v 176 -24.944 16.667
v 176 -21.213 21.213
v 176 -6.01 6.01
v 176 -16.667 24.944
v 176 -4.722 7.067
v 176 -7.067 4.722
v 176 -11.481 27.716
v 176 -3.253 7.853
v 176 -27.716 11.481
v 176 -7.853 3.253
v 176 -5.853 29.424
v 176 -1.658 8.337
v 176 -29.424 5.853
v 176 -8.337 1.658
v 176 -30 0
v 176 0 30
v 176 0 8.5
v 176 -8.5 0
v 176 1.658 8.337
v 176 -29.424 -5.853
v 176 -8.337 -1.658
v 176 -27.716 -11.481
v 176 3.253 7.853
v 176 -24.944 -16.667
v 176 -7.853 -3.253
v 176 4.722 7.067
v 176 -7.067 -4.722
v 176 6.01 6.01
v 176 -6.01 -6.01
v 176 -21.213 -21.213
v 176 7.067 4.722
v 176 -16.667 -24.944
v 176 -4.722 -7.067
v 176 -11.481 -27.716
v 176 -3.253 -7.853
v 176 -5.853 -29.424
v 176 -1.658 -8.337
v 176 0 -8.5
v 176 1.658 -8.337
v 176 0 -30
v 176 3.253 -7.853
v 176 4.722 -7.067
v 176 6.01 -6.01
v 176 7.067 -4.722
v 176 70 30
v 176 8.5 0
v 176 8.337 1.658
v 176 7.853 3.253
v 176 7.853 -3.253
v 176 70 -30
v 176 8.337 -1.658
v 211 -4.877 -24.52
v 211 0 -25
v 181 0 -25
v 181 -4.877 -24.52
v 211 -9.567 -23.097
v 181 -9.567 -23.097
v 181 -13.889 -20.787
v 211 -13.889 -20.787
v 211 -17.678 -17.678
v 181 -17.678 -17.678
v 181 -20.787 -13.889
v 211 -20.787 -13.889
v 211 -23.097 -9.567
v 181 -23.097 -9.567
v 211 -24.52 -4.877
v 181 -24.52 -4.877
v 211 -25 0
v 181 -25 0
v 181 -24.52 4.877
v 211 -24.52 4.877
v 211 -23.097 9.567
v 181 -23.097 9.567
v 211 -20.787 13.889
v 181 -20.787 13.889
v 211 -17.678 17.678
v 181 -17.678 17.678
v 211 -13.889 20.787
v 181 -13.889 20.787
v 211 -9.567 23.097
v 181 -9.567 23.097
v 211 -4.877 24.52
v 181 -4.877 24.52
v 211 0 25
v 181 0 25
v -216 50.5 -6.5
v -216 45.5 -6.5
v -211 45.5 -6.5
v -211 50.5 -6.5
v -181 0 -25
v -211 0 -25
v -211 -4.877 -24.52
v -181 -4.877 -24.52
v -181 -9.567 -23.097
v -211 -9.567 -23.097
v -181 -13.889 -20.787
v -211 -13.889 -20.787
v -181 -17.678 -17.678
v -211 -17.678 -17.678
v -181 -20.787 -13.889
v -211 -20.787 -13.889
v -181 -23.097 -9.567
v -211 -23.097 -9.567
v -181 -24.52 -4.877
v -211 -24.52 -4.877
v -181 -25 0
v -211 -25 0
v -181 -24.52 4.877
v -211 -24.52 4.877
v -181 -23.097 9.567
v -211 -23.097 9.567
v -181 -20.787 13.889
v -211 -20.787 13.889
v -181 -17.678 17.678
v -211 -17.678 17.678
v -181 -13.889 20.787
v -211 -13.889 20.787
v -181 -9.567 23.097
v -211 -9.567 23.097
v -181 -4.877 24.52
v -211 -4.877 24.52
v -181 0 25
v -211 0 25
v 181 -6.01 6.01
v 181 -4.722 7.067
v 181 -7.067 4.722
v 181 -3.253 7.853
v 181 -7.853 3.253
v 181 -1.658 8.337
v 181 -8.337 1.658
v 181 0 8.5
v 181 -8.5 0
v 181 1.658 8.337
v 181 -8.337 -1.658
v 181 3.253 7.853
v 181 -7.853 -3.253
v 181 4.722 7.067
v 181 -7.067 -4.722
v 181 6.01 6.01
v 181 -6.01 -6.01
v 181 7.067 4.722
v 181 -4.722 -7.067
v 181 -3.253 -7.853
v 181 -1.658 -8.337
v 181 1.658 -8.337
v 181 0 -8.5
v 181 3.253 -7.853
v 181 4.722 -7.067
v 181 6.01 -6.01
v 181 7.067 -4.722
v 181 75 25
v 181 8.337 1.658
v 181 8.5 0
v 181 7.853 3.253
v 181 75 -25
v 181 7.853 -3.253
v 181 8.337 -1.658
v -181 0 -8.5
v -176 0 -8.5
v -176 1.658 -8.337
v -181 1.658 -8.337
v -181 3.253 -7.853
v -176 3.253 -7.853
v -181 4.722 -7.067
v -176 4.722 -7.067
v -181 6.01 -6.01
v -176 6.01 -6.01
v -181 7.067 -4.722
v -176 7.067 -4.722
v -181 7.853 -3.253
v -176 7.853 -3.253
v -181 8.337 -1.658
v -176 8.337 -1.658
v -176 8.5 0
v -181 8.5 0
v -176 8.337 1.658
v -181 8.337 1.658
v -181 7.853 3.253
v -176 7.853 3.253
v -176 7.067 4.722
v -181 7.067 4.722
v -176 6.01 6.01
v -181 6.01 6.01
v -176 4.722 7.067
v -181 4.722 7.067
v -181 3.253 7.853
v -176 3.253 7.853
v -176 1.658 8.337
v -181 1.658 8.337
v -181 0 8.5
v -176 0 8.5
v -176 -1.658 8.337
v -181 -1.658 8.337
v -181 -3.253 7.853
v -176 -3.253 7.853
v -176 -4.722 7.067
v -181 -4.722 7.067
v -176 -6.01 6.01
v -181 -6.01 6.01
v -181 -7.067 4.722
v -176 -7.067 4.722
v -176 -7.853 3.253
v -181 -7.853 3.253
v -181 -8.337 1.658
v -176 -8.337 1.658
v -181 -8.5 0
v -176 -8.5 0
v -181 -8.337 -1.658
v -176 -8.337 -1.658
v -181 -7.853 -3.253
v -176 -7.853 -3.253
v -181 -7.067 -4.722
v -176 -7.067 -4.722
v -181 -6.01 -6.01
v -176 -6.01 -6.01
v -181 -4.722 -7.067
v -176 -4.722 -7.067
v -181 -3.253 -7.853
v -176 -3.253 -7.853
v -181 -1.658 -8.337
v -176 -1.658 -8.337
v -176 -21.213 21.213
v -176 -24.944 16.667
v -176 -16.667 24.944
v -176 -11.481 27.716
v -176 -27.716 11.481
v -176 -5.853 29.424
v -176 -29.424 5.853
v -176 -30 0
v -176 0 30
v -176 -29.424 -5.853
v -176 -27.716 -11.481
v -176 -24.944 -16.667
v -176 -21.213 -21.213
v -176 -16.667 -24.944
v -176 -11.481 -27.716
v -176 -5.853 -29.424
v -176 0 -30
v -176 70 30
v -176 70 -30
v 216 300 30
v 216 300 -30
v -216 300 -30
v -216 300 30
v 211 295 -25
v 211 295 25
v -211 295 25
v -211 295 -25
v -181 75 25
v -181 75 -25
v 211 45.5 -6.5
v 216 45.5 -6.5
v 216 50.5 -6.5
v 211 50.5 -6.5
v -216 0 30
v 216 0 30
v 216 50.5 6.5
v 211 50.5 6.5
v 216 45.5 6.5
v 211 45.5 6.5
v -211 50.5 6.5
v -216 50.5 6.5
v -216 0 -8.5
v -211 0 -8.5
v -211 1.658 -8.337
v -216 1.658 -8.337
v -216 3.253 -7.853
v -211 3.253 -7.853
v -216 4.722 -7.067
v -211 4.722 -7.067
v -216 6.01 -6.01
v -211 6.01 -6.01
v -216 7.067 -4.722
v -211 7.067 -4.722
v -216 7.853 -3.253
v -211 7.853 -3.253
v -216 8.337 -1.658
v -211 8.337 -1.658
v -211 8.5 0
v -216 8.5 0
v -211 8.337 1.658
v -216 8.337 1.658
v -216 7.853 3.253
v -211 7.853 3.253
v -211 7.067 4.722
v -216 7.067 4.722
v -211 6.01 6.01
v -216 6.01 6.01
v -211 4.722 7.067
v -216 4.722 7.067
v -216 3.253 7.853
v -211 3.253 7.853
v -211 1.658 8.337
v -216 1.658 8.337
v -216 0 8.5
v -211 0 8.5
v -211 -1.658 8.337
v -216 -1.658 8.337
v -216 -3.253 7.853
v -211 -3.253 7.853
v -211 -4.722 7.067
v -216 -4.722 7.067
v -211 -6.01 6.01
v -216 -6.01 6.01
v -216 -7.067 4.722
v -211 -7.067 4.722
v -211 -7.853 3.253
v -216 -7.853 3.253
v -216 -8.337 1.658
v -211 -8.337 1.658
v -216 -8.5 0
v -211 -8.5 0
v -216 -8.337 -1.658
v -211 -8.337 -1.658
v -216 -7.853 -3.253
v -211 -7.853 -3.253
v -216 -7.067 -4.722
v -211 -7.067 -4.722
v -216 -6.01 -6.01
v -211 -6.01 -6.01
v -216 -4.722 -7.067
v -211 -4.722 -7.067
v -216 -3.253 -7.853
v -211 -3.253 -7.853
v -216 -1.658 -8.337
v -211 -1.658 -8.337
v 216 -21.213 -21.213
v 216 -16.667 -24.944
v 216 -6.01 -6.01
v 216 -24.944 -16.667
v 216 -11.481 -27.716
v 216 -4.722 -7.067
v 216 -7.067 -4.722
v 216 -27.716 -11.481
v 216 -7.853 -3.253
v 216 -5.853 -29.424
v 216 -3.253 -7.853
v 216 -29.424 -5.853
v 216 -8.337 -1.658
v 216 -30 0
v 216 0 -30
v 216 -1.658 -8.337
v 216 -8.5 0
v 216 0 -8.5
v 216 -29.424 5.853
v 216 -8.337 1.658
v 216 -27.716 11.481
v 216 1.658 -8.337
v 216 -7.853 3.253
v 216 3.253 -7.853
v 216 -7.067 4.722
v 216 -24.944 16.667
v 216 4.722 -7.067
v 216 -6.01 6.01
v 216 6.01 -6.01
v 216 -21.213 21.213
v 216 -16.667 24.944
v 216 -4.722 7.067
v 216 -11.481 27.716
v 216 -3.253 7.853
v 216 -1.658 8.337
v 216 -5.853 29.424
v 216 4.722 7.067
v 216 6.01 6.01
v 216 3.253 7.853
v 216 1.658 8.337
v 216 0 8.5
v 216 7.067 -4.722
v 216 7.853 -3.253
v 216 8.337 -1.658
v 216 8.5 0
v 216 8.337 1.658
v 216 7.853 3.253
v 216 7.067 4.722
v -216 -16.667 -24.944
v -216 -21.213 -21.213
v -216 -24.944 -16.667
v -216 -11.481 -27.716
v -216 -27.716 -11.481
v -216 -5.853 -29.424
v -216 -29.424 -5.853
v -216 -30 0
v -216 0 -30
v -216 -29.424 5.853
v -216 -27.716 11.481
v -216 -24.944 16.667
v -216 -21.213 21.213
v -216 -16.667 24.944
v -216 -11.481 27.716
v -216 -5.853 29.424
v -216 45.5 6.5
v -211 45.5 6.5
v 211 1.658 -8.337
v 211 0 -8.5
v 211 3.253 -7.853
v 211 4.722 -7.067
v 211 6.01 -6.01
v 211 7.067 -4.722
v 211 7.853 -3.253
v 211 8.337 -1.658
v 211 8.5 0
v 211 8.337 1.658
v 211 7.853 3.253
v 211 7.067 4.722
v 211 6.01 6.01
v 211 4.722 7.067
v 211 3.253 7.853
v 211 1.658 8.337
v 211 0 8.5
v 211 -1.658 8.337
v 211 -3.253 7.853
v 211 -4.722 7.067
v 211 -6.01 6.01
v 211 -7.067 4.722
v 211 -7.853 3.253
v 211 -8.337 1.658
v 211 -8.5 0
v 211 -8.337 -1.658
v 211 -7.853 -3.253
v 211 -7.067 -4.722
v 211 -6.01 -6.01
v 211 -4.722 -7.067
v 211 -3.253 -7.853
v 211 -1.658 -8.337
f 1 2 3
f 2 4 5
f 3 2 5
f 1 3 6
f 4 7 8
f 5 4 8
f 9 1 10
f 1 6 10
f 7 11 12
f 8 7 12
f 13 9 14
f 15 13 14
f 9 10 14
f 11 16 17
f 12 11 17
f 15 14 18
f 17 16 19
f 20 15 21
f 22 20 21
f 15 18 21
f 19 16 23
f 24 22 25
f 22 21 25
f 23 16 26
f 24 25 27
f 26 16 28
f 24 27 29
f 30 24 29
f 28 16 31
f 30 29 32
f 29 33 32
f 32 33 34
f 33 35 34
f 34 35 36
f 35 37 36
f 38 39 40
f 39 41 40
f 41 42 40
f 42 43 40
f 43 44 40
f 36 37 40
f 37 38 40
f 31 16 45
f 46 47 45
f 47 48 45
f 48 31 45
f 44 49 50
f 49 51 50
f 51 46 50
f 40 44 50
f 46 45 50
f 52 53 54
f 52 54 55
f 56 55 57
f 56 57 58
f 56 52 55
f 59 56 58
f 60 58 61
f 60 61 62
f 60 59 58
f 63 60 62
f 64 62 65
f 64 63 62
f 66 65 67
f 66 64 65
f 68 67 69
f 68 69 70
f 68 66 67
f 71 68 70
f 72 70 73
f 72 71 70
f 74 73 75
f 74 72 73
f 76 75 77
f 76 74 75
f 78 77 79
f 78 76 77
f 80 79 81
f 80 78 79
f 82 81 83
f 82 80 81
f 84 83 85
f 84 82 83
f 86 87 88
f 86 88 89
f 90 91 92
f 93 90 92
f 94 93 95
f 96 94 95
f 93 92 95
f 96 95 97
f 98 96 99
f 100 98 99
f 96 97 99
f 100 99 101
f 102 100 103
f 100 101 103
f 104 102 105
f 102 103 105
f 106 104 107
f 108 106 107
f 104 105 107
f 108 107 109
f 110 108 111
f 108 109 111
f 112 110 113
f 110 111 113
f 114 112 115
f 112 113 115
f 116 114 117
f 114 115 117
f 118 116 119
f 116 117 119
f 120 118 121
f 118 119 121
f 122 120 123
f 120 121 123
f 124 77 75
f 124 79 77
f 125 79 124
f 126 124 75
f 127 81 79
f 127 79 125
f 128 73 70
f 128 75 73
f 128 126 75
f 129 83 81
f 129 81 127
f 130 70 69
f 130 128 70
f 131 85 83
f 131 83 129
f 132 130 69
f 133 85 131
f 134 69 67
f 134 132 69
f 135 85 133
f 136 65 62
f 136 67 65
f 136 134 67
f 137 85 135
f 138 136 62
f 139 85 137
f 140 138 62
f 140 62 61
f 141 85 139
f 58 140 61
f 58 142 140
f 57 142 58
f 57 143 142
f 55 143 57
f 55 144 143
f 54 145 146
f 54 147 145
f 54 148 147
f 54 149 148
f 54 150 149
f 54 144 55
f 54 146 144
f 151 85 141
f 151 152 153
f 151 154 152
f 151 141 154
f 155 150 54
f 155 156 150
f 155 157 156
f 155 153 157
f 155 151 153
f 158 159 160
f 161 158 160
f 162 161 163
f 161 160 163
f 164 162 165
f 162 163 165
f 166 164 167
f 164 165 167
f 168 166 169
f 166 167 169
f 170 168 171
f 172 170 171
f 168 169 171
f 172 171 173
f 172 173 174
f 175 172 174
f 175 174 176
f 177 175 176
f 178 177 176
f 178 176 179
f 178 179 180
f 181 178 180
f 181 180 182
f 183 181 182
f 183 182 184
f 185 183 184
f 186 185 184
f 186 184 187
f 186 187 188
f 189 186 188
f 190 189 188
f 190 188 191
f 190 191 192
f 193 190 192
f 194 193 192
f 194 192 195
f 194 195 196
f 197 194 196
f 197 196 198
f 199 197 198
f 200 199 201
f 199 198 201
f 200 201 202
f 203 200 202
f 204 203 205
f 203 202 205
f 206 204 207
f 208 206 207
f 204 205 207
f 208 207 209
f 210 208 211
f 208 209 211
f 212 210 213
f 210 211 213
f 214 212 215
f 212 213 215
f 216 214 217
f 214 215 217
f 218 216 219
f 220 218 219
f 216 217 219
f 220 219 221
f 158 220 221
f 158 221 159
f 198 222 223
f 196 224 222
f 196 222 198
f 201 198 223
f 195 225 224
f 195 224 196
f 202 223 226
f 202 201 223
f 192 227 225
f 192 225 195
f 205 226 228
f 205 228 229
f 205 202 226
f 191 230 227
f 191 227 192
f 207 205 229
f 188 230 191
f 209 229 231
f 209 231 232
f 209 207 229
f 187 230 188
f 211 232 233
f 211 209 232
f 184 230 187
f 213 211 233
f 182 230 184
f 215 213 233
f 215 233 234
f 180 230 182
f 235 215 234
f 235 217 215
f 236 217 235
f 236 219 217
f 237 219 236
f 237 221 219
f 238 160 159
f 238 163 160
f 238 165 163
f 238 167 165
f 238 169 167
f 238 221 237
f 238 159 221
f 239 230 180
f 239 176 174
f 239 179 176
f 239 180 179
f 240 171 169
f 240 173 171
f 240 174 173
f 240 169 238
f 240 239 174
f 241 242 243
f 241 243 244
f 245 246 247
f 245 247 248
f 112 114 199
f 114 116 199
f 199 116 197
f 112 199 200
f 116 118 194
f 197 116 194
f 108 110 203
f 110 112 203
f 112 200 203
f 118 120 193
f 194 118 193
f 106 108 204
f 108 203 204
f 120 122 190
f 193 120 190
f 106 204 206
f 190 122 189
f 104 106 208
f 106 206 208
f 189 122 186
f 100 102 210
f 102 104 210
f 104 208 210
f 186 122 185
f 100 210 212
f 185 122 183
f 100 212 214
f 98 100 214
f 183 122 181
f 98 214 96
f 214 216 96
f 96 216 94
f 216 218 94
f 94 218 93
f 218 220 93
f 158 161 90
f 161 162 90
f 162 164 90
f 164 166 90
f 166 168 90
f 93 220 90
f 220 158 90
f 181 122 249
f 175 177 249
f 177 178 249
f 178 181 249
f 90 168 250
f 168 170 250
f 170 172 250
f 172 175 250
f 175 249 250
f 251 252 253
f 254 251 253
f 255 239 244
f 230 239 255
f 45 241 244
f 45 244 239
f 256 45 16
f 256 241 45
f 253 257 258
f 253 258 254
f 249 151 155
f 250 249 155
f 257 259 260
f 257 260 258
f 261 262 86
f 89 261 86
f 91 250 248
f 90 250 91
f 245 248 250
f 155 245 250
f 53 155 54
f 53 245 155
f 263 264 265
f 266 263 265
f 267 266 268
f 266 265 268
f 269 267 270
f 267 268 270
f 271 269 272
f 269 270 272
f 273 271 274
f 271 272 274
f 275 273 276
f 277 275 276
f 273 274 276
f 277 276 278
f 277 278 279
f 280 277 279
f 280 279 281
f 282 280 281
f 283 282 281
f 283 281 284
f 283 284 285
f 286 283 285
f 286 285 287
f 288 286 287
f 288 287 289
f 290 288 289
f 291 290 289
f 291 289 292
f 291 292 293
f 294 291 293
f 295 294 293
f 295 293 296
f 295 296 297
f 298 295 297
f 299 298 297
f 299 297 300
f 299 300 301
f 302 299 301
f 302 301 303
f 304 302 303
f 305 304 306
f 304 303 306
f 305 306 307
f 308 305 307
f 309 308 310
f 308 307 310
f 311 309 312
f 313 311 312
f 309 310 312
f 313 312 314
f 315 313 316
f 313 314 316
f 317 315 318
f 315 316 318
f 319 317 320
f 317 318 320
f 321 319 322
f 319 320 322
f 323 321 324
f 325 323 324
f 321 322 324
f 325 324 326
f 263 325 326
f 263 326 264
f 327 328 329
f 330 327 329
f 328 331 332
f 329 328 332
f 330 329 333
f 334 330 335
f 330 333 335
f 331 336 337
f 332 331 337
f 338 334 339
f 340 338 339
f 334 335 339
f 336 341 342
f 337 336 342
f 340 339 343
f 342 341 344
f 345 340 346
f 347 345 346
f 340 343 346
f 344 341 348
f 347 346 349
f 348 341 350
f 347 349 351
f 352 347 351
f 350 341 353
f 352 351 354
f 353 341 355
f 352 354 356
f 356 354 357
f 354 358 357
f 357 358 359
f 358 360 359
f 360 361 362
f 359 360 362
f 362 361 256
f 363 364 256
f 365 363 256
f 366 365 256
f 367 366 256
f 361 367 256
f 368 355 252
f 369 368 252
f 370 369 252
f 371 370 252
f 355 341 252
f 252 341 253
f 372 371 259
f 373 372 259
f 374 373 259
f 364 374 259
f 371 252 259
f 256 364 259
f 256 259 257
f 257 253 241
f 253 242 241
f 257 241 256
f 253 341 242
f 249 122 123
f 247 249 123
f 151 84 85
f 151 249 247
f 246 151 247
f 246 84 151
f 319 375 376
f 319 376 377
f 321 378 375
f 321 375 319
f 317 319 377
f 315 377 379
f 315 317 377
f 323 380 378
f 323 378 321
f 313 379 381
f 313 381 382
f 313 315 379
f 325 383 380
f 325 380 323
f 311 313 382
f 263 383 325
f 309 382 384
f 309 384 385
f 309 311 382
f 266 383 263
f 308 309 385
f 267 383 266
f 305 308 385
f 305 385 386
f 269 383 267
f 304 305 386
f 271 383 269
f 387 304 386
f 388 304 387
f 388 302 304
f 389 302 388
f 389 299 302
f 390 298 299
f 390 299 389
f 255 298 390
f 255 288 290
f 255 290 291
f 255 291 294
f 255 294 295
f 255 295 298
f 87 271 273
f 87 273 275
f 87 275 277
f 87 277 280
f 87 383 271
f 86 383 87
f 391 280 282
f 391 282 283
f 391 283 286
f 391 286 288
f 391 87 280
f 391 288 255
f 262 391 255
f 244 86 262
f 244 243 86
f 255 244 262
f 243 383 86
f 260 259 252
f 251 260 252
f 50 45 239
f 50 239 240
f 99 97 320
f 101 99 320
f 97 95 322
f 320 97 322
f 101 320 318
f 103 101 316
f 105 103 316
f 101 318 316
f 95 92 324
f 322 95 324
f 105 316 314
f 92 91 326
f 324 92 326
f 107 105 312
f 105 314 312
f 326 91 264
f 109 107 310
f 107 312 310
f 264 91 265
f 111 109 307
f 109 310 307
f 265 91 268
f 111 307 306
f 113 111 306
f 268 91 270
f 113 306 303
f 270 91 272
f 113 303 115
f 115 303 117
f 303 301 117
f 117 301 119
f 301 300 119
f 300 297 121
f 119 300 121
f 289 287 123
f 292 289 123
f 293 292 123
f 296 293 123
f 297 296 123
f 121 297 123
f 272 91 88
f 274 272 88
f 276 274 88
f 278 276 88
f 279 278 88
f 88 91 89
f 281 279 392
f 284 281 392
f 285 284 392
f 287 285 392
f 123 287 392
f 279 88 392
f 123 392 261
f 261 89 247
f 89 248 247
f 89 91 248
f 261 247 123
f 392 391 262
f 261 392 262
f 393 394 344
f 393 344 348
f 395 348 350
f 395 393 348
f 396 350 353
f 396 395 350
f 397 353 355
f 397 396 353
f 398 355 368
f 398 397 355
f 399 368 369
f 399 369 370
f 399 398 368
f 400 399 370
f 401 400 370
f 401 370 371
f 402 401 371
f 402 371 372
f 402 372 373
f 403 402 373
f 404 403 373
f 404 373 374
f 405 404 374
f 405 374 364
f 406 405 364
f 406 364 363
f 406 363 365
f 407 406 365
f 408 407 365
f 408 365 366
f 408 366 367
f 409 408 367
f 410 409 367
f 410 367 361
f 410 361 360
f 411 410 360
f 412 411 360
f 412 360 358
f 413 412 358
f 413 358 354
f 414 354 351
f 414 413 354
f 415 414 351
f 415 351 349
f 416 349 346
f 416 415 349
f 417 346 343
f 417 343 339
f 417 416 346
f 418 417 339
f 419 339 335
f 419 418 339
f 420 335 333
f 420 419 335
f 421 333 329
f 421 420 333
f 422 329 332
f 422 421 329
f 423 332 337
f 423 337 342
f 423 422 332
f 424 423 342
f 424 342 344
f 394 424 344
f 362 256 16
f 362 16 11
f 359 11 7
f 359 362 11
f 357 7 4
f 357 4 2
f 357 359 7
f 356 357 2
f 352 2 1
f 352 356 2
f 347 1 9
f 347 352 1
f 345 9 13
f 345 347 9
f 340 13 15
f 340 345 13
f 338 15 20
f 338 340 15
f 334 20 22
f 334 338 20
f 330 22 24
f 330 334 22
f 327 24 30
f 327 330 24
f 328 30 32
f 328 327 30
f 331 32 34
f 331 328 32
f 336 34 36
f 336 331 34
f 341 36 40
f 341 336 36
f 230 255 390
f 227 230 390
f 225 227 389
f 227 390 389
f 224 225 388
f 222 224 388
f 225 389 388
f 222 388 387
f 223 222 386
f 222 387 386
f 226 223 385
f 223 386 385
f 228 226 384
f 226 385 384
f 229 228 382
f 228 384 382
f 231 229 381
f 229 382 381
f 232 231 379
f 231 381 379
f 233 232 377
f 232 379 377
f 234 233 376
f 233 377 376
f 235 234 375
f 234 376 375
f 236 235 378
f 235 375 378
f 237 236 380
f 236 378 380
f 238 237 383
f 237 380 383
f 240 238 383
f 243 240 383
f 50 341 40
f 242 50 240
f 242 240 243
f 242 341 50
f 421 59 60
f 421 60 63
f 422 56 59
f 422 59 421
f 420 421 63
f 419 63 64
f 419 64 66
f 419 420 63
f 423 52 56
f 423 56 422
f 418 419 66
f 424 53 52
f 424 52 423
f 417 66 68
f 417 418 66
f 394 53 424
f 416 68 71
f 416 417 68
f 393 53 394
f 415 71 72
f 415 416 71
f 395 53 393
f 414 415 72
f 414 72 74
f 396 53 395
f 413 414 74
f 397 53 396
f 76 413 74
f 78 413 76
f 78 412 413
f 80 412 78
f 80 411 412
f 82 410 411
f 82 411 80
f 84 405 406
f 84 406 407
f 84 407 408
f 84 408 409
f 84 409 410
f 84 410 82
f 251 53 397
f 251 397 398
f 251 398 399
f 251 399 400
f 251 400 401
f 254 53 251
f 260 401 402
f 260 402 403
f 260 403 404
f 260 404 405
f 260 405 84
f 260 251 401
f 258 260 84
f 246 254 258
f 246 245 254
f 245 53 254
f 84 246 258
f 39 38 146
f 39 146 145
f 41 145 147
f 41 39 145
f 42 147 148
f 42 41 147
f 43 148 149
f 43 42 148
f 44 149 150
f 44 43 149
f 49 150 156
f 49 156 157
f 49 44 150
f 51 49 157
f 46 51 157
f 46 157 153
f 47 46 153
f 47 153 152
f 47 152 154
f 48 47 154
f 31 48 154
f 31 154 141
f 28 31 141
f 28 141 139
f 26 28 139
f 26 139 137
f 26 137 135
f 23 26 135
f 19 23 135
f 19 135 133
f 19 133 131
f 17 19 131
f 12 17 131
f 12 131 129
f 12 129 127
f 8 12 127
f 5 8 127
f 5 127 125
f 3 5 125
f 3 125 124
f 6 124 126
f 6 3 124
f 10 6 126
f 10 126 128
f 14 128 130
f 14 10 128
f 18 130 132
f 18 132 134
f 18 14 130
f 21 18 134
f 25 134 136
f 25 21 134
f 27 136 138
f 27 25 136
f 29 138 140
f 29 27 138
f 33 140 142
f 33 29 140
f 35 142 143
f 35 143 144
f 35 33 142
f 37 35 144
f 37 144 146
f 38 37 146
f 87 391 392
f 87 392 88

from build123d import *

# Parameters (mm, degrees)
BOSS_EXTRUDE1_START = -216
SKETCH3_W           = 13
SKETCH3_H           = 5
BOSS_EXTRUDE1_DEPTH = 5
BOSS_EXTRUDE2_START = -211
SKETCH3_4_W         = 5
SKETCH3_4_H         = 5
BOSS_EXTRUDE2_DEPTH = 30
BOSS_EXTRUDE3_START = -181
SKETCH3_5_W         = 50
SKETCH3_5_H         = 220
BOSS_EXTRUDE3_DEPTH = 5
BOSS_EXTRUDE4_START = -176
SKETCH3_6_W         = 5
SKETCH3_6_H         = 5
SKETCH3_6_W_2       = 50
BOSS_EXTRUDE4_DEPTH = 176
SKETCH6_R           = 8.5
CUT_EXTRUDE1_DEPTH  = 371.885427053


with BuildPart() as part:
    # Sketch3 → Boss-Extrude1 (new body)
    with BuildSketch(Plane(origin=(0, 0, 0), x_dir=(0, 0, -1), z_dir=(1, 0, 0)).offset(BOSS_EXTRUDE1_START)):
        with BuildLine():
            Line((-30, 0), (-30, 300))
            Line((-30, 300), (30, 300))
            Line((30, 300), (30, 0))
            ThreePointArc((30, 0), (0, -30), (-30, 0))
        make_face()
        with Locations((0, 48)):
            Rectangle(SKETCH3_W, SKETCH3_H, mode=Mode.SUBTRACT)
    extrude(amount=BOSS_EXTRUDE1_DEPTH)

    # Sketch3<4> → Boss-Extrude2 (add)
    with BuildSketch(Plane(origin=(0, 0, 0), x_dir=(0, 0, -1), z_dir=(1, 0, 0)).offset(BOSS_EXTRUDE2_START)):
        Polygon((-30, 300), (-30, 75), (-25, 75), (-25, 295), (25, 295), (25, 75), (30, 75), (30, 300), align=None)
        with BuildLine():
            Line((-30, 70), (-30, 0))
            ThreePointArc((-30, 0), (0, -30), (30, 0))
            Line((30, 0), (30, 70))
            Line((30, 70), (25, 70))
            Line((25, 70), (25, 0))
            ThreePointArc((25, 0), (0, -25), (-25, 0))
            Line((-25, 0), (-25, 70))
            Line((-25, 70), (-30, 70))
        make_face()
        with Locations((-27.5, 72.5)):
            Rectangle(SKETCH3_4_W, SKETCH3_4_H)
        with Locations((27.5, 72.5)):
            Rectangle(SKETCH3_4_W, SKETCH3_4_H)
    extrude(amount=BOSS_EXTRUDE2_DEPTH)

    # Sketch3<5> → Boss-Extrude3 (add)
    with BuildSketch(Plane(origin=(0, 0, 0), x_dir=(0, 0, -1), z_dir=(1, 0, 0)).offset(BOSS_EXTRUDE3_START)):
        with BuildLine():
            ThreePointArc((-30, 0), (0, -30), (30, 0))
            Line((30, 0), (30, 300))
            Line((30, 300), (-30, 300))
            Line((-30, 300), (-30, 0))
        make_face()
        with Locations((0, 185)):
            Rectangle(SKETCH3_5_W, SKETCH3_5_H, mode=Mode.SUBTRACT)
    extrude(amount=BOSS_EXTRUDE3_DEPTH)

    # Sketch3<6> → Boss-Extrude4 (add)
    with BuildSketch(Plane(origin=(0, 0, 0), x_dir=(0, 0, -1), z_dir=(1, 0, 0)).offset(BOSS_EXTRUDE4_START)):
        Polygon((-30, 300), (-30, 75), (-25, 75), (-25, 295), (25, 295), (25, 75), (30, 75), (30, 300), align=None)
        with Locations((-27.5, 72.5)):
            Rectangle(SKETCH3_6_W, SKETCH3_6_H)
        with Locations((0, 72.5)):
            Rectangle(SKETCH3_6_W_2, SKETCH3_6_H)
        with Locations((27.5, 72.5)):
            Rectangle(SKETCH3_6_W, SKETCH3_6_H)
    extrude(amount=BOSS_EXTRUDE4_DEPTH)

    # Sketch6 → Cut-Extrude1 (cut, through all)
    with BuildSketch(Plane(origin=(0, 0, 0), x_dir=(0, 0, -1), z_dir=(1, 0, 0))):
        Circle(SKETCH6_R)
    extrude(amount=-CUT_EXTRUDE1_DEPTH, mode=Mode.SUBTRACT)

    # Mirror5: part across plane


with BuildPart() as part_1:
    add(part.part)
    add(part.part.mirror(Plane(origin=(0, 0, 0), x_dir=(0, 0, 1), z_dir=(1, 0, 0))))


solid = part_1.part
